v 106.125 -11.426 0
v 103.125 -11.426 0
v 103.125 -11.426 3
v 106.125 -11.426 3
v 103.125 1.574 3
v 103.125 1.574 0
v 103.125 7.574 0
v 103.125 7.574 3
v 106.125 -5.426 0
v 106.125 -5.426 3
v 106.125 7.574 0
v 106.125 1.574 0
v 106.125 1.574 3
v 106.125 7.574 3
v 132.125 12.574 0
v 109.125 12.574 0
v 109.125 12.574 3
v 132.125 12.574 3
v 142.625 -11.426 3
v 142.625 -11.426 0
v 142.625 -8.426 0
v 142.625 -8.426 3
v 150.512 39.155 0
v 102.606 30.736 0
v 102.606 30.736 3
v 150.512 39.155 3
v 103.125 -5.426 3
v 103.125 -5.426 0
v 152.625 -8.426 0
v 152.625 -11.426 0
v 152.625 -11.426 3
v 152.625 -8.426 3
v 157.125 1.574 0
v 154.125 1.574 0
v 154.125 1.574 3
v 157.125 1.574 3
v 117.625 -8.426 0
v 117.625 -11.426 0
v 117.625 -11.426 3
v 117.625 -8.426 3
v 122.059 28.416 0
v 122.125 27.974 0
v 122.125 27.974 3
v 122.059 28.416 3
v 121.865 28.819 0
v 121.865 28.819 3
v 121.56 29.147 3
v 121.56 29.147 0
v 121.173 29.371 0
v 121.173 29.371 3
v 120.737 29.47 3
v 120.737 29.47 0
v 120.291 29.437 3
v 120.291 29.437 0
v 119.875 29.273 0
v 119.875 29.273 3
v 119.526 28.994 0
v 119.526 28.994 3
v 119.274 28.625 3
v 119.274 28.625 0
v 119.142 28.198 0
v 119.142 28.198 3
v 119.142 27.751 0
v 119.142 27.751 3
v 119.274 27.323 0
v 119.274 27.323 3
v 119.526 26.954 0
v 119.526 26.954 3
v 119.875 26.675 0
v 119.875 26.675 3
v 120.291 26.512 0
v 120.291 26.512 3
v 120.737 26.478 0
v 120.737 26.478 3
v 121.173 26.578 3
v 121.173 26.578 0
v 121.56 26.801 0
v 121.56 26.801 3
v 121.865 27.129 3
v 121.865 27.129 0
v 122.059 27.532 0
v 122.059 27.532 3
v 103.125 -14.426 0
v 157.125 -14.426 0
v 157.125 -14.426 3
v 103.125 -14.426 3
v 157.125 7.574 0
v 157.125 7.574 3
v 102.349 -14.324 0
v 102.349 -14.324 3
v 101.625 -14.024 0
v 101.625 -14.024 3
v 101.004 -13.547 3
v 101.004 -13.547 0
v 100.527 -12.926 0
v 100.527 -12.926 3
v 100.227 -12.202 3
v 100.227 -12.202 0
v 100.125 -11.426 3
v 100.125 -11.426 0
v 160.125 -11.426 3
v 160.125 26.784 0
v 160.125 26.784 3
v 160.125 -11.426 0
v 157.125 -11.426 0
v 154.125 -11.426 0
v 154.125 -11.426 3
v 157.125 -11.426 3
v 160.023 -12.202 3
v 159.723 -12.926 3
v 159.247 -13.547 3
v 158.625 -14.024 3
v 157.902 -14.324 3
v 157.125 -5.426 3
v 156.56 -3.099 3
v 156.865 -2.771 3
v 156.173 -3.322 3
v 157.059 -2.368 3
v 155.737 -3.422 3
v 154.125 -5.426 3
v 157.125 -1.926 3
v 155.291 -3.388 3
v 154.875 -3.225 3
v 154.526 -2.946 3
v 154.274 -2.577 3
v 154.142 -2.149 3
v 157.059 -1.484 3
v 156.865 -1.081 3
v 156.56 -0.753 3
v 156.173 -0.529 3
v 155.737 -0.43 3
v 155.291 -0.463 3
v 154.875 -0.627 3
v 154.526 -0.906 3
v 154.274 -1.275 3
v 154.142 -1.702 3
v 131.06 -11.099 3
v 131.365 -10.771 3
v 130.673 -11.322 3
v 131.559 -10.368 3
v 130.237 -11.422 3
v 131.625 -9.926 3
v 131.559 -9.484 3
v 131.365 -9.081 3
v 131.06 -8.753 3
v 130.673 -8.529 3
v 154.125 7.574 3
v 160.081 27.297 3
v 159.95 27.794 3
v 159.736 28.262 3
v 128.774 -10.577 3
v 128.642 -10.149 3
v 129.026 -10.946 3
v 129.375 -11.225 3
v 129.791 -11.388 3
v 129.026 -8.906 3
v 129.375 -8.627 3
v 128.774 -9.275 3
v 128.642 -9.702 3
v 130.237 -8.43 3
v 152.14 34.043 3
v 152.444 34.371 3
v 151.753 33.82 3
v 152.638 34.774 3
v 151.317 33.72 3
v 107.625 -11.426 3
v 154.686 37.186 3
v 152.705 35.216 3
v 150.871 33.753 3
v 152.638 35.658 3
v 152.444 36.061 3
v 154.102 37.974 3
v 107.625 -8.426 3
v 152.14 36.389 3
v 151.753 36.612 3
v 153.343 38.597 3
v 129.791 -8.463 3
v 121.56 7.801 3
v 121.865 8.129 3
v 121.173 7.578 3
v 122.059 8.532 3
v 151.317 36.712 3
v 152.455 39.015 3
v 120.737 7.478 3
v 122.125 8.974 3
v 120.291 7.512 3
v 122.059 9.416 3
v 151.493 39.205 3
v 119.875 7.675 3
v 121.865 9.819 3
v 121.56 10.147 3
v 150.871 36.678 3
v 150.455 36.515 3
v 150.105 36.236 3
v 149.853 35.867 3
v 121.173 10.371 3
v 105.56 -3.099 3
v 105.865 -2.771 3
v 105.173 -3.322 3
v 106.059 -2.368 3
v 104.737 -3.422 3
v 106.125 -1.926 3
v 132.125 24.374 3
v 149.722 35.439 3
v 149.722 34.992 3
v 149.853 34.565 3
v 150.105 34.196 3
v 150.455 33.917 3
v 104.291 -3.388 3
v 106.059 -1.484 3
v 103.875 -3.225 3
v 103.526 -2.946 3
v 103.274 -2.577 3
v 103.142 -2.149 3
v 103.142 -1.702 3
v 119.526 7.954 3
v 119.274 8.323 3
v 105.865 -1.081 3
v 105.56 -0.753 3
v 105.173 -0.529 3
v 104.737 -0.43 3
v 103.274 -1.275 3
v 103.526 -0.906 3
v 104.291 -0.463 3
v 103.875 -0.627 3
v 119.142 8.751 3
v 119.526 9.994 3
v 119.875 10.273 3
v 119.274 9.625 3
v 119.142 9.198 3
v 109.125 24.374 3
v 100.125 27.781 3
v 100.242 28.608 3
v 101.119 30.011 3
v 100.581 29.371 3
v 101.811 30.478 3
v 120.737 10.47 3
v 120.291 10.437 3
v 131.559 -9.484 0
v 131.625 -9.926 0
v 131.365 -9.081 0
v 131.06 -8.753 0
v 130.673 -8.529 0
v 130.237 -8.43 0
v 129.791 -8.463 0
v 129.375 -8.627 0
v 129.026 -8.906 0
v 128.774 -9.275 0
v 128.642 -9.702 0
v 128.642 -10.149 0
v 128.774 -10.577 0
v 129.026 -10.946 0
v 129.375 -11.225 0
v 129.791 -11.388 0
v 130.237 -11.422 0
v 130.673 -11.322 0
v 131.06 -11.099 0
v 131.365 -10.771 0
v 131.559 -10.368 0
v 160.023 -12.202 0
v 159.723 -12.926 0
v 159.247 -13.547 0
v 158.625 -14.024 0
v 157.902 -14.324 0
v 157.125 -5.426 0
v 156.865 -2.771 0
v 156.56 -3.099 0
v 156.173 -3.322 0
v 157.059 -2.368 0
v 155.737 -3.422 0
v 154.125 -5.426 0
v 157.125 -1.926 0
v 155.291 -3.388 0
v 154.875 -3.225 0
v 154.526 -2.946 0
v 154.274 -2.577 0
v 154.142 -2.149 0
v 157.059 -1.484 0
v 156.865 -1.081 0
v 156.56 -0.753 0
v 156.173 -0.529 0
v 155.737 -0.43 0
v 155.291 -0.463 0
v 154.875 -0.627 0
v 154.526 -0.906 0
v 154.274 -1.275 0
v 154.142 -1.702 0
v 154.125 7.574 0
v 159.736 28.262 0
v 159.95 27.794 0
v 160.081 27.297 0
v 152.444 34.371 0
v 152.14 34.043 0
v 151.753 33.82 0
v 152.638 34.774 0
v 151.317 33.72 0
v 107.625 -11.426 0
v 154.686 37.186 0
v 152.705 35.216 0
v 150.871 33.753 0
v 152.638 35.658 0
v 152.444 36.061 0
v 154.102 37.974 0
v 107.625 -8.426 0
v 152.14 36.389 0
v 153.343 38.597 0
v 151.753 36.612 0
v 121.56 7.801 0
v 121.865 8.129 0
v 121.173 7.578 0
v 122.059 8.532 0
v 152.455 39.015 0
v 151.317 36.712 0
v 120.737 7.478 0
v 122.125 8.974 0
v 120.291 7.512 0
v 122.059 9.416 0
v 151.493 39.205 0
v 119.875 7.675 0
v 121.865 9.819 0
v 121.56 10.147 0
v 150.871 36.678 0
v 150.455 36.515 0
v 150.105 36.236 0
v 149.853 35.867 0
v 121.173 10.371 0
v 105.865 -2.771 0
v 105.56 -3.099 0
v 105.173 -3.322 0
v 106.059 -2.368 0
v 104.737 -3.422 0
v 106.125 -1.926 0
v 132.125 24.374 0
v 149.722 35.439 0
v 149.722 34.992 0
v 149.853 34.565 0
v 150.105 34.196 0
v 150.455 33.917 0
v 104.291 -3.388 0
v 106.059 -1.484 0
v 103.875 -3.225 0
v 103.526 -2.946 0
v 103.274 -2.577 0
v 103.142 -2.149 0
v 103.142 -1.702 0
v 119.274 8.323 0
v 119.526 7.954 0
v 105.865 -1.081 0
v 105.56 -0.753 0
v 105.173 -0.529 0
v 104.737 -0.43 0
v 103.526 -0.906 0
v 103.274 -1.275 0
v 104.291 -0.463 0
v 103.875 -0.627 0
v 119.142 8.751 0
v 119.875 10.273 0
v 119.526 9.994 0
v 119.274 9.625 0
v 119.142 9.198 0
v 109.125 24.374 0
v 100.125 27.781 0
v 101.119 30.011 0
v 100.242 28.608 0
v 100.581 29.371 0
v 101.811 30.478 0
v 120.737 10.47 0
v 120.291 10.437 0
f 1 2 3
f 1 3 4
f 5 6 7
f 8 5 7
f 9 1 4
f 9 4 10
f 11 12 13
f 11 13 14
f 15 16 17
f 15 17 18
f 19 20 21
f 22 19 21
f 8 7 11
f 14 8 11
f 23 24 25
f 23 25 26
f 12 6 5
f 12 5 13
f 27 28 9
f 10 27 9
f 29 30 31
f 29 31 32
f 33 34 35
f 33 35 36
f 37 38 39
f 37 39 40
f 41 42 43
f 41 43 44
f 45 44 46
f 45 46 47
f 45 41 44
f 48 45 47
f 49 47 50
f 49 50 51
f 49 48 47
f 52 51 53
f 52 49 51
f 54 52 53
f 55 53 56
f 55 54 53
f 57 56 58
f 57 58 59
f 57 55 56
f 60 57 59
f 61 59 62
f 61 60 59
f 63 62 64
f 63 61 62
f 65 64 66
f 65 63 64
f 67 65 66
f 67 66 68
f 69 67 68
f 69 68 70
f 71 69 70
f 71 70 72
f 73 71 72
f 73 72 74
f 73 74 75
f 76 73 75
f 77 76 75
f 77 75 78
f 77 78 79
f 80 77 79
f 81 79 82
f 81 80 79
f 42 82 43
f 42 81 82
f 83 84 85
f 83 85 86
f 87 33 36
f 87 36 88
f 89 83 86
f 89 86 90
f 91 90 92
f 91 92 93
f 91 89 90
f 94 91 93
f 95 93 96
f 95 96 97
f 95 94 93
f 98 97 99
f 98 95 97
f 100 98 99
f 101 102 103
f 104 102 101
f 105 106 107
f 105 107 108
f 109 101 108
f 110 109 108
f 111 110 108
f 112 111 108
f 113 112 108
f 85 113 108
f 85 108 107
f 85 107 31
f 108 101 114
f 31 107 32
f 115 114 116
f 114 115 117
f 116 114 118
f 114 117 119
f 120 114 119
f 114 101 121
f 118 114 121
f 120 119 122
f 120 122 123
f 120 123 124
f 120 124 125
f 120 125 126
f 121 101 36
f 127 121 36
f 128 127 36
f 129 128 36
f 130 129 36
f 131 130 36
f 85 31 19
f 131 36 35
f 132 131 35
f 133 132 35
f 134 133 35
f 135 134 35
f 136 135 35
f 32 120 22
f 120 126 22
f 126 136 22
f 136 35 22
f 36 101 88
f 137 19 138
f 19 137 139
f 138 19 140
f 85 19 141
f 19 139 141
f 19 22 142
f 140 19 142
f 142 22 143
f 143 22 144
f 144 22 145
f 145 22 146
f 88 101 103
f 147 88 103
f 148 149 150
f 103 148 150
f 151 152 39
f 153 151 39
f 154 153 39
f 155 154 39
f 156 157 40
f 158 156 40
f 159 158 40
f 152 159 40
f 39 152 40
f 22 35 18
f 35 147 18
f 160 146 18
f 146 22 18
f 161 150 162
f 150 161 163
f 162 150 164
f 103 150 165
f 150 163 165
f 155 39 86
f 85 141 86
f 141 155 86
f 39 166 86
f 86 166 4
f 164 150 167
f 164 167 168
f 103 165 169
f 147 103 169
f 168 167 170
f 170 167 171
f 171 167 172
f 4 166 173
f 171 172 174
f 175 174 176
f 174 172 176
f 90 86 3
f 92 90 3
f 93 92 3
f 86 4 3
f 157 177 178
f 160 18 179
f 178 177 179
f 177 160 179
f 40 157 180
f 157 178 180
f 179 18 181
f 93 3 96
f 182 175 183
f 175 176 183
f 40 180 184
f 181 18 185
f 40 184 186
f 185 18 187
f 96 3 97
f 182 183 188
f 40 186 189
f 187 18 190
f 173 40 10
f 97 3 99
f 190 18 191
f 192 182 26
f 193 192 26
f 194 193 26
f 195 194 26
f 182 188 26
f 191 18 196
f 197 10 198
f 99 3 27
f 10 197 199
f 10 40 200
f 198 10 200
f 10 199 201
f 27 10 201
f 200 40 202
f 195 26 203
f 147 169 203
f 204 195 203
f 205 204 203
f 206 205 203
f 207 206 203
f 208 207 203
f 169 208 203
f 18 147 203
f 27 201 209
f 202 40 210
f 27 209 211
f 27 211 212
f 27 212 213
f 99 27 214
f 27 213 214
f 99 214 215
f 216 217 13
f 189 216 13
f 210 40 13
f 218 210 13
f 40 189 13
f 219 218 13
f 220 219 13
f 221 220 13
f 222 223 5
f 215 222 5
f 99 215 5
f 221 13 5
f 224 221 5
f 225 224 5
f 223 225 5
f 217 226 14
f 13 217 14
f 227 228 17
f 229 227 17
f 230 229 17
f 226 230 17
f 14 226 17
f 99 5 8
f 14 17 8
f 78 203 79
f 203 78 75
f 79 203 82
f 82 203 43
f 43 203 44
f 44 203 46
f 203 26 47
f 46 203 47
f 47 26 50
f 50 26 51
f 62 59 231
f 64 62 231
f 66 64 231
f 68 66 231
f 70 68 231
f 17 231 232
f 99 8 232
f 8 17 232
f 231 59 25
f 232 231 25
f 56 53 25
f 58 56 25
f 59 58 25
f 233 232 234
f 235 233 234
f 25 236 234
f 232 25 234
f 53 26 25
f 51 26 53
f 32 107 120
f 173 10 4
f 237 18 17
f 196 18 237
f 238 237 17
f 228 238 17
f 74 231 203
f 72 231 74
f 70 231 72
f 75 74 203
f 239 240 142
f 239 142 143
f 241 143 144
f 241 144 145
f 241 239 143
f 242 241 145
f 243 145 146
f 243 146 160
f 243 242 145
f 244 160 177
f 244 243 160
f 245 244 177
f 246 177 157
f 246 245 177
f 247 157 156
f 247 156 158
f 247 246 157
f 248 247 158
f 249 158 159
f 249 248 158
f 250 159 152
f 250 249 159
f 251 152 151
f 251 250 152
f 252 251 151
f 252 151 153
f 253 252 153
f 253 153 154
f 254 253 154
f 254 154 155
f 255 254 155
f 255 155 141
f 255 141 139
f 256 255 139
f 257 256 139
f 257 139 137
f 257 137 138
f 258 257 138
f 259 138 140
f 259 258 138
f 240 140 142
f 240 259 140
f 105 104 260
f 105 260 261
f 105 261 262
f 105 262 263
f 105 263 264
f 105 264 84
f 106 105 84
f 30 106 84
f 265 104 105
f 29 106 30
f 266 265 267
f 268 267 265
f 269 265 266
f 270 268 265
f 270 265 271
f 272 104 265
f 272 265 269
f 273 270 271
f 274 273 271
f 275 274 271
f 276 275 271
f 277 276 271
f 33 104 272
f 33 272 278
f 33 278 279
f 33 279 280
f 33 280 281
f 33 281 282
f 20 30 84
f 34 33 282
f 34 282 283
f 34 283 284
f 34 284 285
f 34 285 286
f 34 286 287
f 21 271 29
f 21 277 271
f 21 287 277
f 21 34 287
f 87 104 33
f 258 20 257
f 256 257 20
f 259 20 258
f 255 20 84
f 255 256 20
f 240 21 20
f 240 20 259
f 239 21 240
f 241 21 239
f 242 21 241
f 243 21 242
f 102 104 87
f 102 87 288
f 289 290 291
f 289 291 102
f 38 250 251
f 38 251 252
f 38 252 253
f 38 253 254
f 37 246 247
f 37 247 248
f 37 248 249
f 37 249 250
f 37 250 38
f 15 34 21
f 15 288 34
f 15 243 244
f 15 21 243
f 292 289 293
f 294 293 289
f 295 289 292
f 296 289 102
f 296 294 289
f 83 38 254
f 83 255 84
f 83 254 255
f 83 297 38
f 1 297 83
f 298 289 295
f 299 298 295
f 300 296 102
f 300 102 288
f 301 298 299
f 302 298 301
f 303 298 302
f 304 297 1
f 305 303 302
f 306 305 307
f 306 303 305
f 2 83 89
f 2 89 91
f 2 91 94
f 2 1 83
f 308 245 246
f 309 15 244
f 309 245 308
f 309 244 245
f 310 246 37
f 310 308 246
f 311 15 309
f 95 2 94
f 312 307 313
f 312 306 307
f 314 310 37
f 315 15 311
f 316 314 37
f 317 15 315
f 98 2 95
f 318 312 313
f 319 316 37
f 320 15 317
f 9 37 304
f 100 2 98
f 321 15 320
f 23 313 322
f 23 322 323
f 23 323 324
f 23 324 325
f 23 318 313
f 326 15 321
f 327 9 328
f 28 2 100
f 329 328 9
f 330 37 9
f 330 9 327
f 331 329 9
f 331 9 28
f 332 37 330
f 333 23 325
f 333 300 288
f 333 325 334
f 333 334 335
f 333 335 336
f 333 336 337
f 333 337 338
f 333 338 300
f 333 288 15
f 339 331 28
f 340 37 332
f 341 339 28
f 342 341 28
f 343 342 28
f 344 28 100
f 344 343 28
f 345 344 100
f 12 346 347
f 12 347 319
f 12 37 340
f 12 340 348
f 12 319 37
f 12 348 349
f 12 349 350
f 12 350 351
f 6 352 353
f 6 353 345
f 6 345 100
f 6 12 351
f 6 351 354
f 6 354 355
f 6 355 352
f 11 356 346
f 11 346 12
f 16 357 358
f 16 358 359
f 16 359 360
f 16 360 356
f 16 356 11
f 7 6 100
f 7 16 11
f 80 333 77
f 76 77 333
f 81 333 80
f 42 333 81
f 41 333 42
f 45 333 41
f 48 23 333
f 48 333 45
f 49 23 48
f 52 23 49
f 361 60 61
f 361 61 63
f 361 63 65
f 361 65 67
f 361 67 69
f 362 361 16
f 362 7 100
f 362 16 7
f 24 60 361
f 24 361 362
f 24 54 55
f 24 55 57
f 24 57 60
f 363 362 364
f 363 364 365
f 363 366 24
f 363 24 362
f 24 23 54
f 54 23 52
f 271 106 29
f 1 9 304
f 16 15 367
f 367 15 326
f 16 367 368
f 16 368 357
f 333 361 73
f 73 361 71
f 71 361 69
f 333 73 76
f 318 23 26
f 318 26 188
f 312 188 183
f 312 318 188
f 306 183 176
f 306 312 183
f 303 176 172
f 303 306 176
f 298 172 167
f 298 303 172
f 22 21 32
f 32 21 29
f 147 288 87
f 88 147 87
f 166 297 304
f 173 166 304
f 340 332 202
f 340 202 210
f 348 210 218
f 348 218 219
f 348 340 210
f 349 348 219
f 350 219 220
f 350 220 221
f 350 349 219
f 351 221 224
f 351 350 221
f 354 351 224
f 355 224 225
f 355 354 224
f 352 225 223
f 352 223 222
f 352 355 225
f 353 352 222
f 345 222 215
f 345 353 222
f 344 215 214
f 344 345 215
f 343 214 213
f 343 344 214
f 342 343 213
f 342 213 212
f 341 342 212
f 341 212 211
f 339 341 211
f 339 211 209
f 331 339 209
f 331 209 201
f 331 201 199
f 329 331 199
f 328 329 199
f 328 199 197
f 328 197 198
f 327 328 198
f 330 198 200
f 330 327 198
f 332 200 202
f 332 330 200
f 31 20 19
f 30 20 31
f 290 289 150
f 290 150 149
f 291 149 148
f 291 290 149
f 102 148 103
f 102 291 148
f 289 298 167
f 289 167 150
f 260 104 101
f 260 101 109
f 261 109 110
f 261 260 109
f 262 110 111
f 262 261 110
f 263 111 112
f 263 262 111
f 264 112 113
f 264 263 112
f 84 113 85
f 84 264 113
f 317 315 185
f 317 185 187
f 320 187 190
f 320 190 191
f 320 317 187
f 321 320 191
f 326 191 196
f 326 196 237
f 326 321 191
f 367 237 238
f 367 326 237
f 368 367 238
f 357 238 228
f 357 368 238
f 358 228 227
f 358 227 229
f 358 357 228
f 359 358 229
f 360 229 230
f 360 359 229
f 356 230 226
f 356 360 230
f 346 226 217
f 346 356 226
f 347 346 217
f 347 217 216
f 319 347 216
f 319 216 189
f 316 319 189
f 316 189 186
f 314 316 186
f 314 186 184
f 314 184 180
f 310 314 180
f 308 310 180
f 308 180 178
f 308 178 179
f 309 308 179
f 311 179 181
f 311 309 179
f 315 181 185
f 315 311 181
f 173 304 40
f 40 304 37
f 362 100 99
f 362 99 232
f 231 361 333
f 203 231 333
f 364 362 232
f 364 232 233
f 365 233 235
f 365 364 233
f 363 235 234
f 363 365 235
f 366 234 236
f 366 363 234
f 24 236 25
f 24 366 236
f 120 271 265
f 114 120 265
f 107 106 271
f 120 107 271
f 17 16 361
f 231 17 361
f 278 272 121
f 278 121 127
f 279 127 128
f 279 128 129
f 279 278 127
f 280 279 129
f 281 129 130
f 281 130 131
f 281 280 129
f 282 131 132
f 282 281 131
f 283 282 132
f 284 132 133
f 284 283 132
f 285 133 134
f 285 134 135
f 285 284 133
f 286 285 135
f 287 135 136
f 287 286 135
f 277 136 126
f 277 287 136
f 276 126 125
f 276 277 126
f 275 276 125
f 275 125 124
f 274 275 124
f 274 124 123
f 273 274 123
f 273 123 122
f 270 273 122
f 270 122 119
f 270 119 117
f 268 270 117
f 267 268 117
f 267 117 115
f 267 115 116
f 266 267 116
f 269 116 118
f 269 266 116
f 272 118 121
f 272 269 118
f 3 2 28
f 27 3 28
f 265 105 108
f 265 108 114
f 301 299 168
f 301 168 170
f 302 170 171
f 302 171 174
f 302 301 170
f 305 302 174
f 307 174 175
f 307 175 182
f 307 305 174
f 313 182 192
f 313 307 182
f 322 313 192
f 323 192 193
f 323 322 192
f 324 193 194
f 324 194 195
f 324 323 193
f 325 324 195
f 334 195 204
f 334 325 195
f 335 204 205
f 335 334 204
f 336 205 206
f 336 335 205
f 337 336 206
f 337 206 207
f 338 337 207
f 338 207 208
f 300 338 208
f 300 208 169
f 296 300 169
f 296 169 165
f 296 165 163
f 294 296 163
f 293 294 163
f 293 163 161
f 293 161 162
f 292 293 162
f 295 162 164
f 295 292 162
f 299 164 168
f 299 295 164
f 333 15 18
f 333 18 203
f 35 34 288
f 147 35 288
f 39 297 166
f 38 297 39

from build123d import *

# Parameters (mm, degrees)
ESQUISSE13_R        = 1.5
ESQUISSE13_W        = 3
ESQUISSE13_H        = 6
ESQUISSE13_W_2      = 10
ESQUISSE13_H_2      = 3
ESQUISSE13_W_3      = 23
ESQUISSE13_H_3      = 11.8
BOSS_EXTRU_13_DEPTH = 3


with BuildPart() as part:
    # Esquisse13 → Boss.-Extru.13 (new body)
    with BuildSketch(Plane.XY):
        with BuildLine():
            Line((157.12523298, -14.425795559), (103.12523298, -14.425795559))
            ThreePointArc((103.12523298, -14.425795559), (101.003912637, -13.547115902), (100.12523298, -11.425795559))
            Line((100.12523298, -11.425795559), (100.12523298, 27.781080254))
            ThreePointArc((100.12523298, 27.781080254), (100.827637897, 29.710084358), (102.605937537, 30.735793817))
            Line((102.605937537, 30.735793817), (150.512449504, 39.155436821))
            ThreePointArc((150.512449504, 39.155436821), (152.911964034, 38.833240365), (154.686087677, 37.185828505))
            Line((154.686087677, 37.185828505), (159.736166166, 28.261732306))
            ThreePointArc((159.736166166, 28.261732306), (160.02633618, 27.548162294), (160.12523298, 26.784224979))
            Line((160.12523298, 26.784224979), (160.12523298, -11.425795559))
            ThreePointArc((160.12523298, -11.425795559), (159.246553324, -13.547115902), (157.12523298, -14.425795559))
        make_face()
        with Locations((151.204843429, 35.215818737)):
            Circle(ESQUISSE13_R, mode=Mode.SUBTRACT)
        with Locations((130.12523298, -9.925795559)):
            Circle(ESQUISSE13_R, mode=Mode.SUBTRACT)
        with Locations((120.62523298, 8.974204441)):
            Circle(ESQUISSE13_R, mode=Mode.SUBTRACT)
        with Locations((120.62523298, 27.974204441)):
            Circle(ESQUISSE13_R, mode=Mode.SUBTRACT)
        with Locations((155.62523298, -1.925795559)):
            Circle(ESQUISSE13_R, mode=Mode.SUBTRACT)
        with Locations((104.62523298, -1.925795559)):
            Circle(ESQUISSE13_R, mode=Mode.SUBTRACT)
        with Locations((104.62523298, -8.425795559)):
            Rectangle(ESQUISSE13_W, ESQUISSE13_H, mode=Mode.SUBTRACT)
        with Locations((112.62523298, -9.925795559)):
            Rectangle(ESQUISSE13_W_2, ESQUISSE13_H_2, mode=Mode.SUBTRACT)
        with Locations((155.62523298, -8.425795559)):
            Rectangle(ESQUISSE13_W, ESQUISSE13_H, mode=Mode.SUBTRACT)
        with Locations((147.62523298, -9.925795559)):
            Rectangle(ESQUISSE13_W_2, ESQUISSE13_H_2, mode=Mode.SUBTRACT)
        with Locations((104.62523298, 4.574204441)):
            Rectangle(ESQUISSE13_W, ESQUISSE13_H, mode=Mode.SUBTRACT)
        with Locations((155.62523298, 4.574204441)):
            Rectangle(ESQUISSE13_W, ESQUISSE13_H, mode=Mode.SUBTRACT)
        with Locations((120.62523298, 18.474204441)):
            Rectangle(ESQUISSE13_W_3, ESQUISSE13_H_3, mode=Mode.SUBTRACT)
    extrude(amount=BOSS_EXTRU_13_DEPTH)


solid = part.part
